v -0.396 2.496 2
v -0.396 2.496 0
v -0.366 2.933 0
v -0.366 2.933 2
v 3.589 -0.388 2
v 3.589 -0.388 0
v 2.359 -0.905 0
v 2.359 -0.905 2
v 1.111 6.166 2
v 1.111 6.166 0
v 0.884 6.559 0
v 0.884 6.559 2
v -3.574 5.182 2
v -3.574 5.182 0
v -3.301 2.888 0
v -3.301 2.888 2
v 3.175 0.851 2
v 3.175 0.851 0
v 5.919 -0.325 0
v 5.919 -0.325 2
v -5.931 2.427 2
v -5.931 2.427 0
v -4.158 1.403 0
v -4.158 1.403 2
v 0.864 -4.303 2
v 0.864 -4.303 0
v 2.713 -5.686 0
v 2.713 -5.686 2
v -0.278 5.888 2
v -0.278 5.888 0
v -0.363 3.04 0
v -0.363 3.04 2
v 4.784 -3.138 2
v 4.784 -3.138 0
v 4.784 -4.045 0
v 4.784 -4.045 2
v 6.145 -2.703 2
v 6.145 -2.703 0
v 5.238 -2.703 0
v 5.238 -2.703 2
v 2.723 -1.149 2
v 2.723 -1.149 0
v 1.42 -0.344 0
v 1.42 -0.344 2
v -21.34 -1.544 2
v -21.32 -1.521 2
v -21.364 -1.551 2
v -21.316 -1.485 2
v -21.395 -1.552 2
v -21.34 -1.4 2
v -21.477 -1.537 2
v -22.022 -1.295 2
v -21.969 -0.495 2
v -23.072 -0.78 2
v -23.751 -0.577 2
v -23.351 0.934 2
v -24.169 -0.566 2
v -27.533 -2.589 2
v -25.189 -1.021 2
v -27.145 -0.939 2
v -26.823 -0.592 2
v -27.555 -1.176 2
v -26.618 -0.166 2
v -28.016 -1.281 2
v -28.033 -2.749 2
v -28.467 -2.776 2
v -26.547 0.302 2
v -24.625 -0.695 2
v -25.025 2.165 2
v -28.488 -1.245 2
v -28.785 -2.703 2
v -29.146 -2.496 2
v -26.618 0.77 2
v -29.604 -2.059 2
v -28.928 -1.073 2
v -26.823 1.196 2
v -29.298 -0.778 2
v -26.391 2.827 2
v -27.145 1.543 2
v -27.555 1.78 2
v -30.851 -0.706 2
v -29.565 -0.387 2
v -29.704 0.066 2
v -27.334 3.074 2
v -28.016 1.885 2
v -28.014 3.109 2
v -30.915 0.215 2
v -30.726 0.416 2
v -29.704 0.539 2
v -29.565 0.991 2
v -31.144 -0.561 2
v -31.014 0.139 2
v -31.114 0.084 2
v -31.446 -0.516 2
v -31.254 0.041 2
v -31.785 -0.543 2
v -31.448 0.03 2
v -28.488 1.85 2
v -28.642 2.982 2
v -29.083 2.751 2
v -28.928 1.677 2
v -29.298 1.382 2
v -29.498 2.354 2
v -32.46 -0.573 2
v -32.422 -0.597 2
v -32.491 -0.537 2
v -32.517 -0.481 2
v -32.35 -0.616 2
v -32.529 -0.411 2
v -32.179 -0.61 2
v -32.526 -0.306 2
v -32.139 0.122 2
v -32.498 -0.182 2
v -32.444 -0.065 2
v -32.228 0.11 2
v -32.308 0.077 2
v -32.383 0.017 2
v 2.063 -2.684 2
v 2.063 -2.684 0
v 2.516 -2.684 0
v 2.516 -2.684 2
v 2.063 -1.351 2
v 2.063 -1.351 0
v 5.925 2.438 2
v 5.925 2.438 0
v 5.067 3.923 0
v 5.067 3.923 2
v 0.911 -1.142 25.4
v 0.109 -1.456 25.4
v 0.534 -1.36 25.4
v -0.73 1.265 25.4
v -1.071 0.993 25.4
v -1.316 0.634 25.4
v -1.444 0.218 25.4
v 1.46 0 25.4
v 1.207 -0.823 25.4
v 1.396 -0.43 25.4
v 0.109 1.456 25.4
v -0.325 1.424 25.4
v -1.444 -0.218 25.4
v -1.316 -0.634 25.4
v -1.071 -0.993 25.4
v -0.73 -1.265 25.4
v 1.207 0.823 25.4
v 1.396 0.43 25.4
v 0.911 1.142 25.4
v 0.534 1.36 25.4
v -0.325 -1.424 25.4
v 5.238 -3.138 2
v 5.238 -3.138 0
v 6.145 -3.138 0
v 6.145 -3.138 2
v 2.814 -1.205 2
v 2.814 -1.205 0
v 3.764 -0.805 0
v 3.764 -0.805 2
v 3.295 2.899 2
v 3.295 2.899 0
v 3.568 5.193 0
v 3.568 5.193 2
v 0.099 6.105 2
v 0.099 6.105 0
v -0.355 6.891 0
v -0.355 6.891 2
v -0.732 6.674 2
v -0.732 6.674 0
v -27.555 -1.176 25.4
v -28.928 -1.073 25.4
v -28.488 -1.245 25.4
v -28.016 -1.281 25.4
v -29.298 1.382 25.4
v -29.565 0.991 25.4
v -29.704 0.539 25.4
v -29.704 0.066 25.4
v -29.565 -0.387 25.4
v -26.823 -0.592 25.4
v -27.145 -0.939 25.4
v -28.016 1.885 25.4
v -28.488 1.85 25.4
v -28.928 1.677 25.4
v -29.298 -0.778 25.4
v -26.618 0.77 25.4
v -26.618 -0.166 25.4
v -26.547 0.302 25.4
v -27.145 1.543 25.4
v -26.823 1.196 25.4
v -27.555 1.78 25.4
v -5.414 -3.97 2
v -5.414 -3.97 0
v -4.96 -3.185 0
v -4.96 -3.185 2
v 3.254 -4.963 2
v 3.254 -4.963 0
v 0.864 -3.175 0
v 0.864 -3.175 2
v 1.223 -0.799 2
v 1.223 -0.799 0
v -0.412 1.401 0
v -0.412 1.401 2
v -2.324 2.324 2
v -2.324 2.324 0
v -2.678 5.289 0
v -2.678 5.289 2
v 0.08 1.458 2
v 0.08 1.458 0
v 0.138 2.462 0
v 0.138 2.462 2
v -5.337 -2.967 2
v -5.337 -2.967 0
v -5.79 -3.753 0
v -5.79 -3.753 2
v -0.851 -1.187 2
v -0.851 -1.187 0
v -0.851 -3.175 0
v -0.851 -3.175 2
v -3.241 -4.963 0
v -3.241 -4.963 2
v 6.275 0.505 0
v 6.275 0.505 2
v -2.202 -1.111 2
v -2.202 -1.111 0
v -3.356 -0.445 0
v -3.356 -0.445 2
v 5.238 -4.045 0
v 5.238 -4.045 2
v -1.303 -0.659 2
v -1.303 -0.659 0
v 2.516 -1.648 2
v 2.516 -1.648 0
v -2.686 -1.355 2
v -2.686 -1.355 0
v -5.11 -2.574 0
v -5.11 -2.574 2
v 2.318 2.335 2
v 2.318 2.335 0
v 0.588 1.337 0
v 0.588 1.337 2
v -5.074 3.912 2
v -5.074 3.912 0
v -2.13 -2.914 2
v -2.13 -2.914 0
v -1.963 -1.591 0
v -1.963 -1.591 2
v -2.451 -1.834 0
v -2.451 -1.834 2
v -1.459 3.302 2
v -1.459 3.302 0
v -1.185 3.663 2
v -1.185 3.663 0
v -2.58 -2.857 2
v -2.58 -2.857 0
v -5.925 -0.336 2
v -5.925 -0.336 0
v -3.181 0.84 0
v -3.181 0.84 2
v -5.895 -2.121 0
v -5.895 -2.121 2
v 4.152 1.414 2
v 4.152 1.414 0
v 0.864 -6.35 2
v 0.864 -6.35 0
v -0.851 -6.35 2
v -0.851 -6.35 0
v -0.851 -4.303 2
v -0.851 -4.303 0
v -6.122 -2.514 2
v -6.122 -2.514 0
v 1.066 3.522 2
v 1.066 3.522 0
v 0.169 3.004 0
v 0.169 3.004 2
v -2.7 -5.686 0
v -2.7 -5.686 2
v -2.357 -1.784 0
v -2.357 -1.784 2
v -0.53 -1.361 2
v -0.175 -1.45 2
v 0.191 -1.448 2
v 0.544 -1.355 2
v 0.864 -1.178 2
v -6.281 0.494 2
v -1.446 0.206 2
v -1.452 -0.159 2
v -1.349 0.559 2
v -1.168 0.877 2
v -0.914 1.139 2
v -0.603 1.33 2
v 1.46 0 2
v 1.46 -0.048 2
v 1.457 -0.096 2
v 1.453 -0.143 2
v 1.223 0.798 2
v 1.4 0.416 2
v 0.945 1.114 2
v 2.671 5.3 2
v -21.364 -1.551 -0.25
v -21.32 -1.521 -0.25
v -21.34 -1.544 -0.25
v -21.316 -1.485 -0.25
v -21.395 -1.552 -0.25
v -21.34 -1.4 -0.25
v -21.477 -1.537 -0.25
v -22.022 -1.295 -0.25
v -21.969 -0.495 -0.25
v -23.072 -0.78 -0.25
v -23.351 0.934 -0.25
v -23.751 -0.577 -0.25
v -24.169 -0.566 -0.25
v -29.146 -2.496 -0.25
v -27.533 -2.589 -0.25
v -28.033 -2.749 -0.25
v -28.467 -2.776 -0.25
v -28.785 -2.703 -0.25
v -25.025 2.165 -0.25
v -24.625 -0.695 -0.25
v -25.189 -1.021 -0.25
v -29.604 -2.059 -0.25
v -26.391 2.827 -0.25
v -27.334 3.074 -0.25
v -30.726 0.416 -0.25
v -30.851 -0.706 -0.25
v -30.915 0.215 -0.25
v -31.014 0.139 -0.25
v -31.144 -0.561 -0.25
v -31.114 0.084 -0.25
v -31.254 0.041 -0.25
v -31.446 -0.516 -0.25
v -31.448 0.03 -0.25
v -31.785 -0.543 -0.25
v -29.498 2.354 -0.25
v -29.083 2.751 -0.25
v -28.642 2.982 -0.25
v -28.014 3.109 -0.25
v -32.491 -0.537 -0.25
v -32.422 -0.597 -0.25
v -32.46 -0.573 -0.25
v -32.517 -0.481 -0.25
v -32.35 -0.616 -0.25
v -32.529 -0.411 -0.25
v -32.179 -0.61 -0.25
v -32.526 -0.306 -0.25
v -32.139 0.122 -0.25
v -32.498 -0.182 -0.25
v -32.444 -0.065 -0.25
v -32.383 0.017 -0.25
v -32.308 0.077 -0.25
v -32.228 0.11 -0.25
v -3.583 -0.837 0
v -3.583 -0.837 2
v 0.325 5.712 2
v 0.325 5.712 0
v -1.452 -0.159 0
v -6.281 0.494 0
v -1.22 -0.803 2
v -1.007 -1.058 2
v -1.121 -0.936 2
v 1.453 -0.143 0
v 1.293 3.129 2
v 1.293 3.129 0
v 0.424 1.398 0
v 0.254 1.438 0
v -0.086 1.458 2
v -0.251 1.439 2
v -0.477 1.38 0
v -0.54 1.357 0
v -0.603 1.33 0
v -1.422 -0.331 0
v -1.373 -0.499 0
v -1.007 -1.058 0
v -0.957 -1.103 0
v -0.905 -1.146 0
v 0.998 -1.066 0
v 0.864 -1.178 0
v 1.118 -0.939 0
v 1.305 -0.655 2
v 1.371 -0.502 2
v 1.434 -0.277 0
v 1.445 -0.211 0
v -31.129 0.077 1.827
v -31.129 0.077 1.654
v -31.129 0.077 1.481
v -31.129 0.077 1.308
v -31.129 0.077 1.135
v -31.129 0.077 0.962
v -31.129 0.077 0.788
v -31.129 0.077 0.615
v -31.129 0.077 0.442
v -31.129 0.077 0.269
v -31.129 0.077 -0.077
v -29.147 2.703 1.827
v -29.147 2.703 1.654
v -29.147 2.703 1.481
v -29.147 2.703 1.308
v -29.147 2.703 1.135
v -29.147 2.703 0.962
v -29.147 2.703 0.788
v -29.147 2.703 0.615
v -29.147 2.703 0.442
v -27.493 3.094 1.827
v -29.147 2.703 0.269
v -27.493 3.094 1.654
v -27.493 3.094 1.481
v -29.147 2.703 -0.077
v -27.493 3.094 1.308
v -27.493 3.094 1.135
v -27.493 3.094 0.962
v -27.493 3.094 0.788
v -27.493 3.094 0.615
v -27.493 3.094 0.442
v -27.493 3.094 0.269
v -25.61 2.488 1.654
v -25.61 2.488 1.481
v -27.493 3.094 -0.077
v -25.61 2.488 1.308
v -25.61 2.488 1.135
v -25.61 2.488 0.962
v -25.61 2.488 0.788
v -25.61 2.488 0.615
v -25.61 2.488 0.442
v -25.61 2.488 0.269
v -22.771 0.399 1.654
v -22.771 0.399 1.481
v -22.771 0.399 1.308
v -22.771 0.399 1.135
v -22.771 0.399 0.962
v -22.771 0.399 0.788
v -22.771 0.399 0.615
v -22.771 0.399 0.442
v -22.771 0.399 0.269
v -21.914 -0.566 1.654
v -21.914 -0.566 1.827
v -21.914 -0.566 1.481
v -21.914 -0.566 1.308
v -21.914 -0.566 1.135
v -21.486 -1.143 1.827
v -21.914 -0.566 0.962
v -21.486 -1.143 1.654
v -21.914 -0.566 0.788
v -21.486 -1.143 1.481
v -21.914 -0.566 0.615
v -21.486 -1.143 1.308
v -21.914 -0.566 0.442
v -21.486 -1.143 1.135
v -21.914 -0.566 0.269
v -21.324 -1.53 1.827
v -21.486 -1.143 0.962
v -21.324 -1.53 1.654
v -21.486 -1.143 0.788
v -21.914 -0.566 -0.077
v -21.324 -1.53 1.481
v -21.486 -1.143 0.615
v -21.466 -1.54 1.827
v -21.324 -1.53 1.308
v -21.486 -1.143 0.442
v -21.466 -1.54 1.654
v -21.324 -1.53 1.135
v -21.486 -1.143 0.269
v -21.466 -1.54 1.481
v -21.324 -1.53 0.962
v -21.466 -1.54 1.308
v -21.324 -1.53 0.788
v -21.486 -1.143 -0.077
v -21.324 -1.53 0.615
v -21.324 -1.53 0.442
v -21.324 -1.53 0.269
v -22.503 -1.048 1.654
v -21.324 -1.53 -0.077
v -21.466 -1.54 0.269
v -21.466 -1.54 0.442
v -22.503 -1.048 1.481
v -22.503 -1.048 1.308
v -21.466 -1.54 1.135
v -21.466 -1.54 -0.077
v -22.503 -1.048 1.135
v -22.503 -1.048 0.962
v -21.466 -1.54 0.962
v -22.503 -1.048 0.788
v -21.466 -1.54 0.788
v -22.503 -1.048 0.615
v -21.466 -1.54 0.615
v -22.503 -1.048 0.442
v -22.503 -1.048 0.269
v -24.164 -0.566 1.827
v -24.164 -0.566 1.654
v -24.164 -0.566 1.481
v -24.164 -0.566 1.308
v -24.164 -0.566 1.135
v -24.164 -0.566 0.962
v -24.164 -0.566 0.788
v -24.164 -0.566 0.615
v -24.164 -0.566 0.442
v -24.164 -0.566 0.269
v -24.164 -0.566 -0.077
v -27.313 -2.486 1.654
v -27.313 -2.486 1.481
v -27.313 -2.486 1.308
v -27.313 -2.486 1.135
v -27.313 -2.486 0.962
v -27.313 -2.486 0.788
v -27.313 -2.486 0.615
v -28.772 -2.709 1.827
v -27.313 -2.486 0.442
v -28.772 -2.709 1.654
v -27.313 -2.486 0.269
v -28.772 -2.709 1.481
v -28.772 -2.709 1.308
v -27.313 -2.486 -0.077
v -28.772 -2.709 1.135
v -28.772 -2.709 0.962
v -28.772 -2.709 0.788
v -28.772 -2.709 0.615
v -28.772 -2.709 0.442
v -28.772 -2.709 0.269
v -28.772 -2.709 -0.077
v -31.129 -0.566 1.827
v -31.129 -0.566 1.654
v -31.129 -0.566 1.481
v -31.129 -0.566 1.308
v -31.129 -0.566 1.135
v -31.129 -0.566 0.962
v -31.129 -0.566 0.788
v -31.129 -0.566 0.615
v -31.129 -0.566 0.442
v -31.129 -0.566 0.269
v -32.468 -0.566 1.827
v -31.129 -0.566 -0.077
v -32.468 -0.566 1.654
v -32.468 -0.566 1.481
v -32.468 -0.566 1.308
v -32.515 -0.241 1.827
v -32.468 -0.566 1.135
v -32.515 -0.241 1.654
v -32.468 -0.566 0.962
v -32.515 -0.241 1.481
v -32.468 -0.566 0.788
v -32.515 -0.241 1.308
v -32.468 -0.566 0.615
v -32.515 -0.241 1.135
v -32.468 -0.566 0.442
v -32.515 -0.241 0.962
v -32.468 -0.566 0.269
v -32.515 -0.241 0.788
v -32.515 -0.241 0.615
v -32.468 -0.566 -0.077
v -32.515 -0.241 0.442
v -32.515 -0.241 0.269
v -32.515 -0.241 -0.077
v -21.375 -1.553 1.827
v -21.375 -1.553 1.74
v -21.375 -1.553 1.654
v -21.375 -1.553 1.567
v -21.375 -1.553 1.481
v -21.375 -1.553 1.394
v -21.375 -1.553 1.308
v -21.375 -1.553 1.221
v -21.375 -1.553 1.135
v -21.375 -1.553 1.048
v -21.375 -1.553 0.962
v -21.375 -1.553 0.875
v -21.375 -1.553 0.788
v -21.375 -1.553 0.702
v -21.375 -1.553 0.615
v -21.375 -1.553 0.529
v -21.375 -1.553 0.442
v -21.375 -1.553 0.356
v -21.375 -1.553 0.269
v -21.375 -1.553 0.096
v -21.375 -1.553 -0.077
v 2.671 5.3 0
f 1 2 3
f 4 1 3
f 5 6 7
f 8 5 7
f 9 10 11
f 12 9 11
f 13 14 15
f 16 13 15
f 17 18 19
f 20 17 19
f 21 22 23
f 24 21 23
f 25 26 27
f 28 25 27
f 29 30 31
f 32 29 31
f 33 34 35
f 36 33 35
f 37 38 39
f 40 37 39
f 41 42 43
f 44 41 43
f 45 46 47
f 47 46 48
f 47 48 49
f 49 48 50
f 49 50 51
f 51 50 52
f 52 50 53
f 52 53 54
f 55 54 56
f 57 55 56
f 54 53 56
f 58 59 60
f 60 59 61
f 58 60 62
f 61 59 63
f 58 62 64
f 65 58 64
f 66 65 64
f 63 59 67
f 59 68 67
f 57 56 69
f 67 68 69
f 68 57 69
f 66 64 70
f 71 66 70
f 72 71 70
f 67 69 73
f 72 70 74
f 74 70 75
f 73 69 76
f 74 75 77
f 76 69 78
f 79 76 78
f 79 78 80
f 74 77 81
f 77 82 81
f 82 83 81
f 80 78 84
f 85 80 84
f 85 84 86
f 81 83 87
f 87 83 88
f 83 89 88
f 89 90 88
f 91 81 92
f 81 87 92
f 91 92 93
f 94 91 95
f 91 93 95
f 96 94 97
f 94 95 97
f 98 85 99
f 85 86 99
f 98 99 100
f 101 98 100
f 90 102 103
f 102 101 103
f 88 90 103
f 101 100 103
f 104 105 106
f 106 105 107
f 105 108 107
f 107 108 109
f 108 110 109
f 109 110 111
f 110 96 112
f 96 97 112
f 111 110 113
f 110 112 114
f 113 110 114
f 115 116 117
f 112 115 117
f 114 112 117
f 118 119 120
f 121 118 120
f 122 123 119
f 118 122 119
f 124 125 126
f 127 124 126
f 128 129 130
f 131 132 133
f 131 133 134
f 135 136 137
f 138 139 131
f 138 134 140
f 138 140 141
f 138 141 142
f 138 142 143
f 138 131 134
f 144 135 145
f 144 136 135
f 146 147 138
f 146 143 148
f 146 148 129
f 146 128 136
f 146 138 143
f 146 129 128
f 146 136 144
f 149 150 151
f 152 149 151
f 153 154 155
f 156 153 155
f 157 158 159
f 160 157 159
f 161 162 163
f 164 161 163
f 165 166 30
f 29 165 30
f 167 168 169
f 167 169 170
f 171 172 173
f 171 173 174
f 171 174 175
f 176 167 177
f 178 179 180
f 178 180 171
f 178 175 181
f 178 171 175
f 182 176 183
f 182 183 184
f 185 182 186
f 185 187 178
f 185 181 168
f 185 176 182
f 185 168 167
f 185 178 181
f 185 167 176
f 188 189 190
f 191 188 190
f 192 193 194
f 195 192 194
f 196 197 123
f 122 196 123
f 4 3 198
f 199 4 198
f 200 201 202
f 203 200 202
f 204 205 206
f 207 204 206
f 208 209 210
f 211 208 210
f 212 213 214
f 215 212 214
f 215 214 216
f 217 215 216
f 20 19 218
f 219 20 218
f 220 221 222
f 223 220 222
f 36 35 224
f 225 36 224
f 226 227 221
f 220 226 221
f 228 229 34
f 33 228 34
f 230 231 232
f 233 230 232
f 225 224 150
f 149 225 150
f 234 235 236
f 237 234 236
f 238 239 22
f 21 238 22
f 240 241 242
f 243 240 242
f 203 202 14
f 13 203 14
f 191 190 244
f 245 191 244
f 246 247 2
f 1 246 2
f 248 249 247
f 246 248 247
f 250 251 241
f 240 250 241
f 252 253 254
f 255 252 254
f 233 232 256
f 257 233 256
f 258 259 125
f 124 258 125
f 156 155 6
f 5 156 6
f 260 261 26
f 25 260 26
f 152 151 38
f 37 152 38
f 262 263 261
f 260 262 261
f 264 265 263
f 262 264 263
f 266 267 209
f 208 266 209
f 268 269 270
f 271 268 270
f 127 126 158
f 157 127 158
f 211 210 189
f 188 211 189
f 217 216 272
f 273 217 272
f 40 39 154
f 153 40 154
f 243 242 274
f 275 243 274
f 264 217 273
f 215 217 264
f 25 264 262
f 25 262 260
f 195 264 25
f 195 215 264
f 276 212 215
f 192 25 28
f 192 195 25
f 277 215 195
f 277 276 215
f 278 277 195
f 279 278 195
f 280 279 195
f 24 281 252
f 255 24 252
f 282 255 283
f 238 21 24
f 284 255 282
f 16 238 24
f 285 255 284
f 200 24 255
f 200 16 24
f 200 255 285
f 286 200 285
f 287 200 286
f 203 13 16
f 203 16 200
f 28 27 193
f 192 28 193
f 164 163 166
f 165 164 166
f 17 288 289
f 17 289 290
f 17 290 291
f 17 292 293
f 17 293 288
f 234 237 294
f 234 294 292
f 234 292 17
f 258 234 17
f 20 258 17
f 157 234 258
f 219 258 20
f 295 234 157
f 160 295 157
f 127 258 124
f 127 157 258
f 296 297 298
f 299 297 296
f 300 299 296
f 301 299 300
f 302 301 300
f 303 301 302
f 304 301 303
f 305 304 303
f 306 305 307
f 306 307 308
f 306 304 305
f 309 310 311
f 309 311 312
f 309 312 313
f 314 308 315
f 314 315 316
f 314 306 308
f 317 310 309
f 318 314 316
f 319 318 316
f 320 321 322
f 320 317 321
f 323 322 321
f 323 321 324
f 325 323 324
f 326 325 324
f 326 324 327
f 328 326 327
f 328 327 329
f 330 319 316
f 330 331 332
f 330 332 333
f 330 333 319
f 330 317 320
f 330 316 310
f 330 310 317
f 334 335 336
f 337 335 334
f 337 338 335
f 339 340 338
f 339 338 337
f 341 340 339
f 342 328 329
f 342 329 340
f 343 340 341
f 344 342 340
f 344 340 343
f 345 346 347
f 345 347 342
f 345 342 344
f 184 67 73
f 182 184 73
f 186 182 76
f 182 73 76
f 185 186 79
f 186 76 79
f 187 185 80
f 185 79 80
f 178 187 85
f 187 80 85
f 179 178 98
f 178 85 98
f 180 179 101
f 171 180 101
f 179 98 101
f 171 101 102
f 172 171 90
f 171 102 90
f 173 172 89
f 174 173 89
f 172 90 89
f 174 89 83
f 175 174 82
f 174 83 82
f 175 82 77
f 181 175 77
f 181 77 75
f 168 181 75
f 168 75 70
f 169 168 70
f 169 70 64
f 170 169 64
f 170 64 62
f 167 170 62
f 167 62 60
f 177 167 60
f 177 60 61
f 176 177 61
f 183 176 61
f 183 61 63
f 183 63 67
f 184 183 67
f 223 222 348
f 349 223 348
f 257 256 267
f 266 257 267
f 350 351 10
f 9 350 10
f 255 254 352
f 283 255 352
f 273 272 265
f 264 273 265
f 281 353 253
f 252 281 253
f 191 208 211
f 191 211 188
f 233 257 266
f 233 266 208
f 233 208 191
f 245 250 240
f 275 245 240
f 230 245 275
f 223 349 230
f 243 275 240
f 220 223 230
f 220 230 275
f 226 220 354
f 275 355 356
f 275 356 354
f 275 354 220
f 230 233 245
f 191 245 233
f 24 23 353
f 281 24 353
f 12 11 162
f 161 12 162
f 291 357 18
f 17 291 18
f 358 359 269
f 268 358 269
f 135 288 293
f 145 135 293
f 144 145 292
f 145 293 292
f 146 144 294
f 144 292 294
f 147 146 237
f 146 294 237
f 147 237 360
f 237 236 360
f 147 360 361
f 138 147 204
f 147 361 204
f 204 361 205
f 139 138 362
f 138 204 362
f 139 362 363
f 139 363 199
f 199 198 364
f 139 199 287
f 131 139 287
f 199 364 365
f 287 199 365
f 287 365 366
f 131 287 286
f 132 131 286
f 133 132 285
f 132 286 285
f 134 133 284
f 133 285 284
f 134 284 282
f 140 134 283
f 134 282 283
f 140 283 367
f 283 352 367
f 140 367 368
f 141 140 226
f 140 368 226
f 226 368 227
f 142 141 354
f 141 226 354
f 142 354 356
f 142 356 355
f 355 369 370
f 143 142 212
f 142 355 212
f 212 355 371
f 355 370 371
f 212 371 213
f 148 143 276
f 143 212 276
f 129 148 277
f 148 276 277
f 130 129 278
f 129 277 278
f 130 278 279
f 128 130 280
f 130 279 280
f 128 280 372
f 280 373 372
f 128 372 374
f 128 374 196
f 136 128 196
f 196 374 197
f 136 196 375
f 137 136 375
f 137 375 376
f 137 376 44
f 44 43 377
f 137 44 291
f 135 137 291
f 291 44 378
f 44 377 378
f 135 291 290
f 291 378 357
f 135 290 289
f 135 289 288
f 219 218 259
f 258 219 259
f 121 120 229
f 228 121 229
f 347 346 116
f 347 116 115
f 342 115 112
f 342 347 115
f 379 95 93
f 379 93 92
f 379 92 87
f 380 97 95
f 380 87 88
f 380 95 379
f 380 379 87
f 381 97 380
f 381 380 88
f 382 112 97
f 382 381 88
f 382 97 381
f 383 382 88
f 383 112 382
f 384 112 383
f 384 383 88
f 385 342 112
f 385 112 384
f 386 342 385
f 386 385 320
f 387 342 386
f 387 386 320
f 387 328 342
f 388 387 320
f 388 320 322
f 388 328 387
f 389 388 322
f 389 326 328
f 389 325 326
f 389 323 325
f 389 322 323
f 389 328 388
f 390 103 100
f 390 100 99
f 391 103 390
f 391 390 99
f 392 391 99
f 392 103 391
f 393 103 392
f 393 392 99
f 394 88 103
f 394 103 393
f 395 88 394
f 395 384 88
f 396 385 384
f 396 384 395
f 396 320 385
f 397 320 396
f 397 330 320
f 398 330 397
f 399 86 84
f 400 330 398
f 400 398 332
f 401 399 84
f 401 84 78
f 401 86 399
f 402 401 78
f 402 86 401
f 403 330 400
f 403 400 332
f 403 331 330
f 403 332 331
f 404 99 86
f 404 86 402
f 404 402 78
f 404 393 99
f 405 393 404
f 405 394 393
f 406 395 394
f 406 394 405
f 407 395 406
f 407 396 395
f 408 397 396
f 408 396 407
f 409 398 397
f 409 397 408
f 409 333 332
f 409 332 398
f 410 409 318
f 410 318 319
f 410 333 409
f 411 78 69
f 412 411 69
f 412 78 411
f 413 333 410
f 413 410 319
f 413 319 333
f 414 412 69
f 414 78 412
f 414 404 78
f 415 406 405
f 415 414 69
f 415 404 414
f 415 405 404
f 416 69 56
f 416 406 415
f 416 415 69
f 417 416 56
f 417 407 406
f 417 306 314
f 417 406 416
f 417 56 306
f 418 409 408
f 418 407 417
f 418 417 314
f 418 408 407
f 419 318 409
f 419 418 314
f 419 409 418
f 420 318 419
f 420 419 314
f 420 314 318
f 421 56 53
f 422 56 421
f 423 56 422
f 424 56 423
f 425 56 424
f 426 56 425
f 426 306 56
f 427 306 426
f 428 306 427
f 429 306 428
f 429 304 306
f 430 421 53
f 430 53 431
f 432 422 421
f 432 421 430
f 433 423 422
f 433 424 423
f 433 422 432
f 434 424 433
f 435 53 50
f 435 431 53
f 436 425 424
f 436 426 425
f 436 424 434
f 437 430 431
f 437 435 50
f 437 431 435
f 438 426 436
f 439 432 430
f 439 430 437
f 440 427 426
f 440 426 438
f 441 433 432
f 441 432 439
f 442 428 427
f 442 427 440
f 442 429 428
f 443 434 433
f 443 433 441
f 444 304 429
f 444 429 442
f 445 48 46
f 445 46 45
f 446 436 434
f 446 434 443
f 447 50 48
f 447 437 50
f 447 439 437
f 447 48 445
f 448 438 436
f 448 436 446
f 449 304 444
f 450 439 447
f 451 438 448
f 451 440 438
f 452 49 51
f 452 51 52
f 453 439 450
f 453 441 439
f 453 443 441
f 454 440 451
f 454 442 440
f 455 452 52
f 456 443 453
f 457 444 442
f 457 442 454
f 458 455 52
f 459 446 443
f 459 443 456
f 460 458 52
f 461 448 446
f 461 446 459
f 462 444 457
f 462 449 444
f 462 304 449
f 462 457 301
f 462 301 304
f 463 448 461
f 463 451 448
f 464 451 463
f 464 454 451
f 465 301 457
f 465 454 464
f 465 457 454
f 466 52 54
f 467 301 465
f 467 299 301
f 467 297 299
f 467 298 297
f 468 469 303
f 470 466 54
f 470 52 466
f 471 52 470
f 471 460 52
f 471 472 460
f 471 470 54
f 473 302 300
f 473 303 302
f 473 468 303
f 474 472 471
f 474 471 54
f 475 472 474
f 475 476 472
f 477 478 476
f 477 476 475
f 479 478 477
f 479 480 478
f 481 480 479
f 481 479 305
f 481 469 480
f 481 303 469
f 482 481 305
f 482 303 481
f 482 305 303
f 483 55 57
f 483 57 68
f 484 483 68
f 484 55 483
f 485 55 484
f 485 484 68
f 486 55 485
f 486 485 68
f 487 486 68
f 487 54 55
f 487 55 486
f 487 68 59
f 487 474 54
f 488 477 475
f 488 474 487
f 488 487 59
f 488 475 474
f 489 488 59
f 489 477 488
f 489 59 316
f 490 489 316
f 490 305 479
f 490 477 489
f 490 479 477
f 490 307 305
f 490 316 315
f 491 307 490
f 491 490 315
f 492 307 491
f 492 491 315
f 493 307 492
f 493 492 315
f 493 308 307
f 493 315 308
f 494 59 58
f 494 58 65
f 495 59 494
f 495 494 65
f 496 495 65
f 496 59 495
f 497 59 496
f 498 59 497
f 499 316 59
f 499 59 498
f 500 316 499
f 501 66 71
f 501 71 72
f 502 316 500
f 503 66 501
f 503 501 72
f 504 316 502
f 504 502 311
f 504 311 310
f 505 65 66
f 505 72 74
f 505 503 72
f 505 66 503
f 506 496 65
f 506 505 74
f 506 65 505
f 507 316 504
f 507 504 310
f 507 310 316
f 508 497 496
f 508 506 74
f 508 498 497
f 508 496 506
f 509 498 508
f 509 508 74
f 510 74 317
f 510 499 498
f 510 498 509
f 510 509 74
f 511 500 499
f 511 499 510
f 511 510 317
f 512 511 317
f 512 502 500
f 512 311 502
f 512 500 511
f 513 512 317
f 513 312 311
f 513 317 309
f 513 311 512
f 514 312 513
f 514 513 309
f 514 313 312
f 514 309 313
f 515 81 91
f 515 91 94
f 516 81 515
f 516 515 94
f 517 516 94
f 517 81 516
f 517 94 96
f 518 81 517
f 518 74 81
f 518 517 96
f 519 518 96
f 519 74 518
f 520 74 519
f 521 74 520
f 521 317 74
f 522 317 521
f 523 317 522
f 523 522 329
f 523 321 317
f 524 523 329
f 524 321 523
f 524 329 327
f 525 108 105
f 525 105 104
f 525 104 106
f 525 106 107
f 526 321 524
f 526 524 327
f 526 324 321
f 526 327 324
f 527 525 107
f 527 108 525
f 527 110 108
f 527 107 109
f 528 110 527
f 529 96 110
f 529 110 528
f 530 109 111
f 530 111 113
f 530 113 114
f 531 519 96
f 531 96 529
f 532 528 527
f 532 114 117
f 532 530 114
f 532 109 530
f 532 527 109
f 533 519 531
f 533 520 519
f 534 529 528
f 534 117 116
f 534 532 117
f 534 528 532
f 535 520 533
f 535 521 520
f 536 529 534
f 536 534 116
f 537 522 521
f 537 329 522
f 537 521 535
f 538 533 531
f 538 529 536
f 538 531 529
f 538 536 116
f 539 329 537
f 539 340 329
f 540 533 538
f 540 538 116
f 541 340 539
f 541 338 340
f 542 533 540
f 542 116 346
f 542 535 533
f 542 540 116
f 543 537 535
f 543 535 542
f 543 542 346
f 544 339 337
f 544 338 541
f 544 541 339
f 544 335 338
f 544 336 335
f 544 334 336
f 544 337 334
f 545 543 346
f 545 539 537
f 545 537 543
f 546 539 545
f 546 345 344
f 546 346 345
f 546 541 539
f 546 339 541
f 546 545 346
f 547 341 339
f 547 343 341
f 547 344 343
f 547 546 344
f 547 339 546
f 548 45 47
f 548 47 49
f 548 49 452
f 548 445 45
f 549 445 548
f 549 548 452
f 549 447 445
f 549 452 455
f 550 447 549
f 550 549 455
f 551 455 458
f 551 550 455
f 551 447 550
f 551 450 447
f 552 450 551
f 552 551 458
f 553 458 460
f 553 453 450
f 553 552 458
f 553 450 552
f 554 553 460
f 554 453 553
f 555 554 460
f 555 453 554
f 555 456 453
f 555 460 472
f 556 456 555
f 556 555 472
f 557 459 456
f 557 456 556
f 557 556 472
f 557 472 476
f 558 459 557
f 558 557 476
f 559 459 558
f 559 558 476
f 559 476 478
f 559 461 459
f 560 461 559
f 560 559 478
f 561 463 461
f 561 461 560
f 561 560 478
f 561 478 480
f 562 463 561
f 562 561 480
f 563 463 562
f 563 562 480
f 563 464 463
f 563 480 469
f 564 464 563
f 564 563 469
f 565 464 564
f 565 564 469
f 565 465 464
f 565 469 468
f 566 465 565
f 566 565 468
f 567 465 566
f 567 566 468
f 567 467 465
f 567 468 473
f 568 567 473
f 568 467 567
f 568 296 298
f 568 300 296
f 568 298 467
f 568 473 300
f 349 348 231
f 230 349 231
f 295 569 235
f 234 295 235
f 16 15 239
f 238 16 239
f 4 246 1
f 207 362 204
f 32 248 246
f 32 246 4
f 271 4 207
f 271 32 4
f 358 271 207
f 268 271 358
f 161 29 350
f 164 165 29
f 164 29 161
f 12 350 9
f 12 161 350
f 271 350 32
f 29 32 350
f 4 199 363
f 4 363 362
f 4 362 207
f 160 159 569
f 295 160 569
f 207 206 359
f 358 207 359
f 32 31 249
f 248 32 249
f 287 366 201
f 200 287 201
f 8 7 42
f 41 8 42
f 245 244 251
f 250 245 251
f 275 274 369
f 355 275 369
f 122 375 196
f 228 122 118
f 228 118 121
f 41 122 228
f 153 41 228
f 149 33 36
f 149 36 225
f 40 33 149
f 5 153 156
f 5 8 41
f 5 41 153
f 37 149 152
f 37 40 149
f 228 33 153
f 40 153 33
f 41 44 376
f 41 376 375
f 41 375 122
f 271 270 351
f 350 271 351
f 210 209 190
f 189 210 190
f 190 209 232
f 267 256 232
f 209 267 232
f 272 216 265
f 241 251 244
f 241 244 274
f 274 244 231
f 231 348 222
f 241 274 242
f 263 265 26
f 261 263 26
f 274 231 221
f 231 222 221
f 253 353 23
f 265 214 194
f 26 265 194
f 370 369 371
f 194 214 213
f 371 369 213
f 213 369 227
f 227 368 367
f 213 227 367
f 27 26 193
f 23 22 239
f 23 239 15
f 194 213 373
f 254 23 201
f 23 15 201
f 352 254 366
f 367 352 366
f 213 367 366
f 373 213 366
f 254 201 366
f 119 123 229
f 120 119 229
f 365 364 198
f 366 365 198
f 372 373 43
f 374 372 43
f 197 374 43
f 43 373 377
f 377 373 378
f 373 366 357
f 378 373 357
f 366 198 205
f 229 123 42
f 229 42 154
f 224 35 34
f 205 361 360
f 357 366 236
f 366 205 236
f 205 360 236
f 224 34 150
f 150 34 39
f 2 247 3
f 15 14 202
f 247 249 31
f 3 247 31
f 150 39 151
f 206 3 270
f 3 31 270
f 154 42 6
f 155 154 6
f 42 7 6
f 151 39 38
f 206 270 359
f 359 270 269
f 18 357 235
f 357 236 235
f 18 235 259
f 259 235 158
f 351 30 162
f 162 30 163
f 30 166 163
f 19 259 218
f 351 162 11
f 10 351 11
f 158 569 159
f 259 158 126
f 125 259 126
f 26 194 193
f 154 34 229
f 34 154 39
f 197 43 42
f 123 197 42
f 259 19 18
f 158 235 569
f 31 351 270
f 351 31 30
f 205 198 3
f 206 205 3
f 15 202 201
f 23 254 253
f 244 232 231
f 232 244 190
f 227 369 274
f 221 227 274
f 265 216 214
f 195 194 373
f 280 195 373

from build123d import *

# Parameters (mm, degrees)
F2_DEPTH  = 2
F1_R      = 1.4605
F3_DEPTH  = 25.4
F5_DEPTH  = 1
F7_SCALE  = 2.25
F9_R      = 1.5875
F10_DEPTH = 25.4


# Not quite as in the source:
# - ends of sketch curves that miss each other by under 0.0002 mm in the source are joined


with BuildPart() as f2:
    # F0 (on Top) → F2 (new body)
    with BuildSketch(Plane.XY):
        Polygon((-0.0127014339, 0.9898670365), (0.0557615141, 1.029394138), (0.138240911, 2.4622835197), (0.1693981397, 3.0035685424), (0.3253258613, 5.7124532465), (1.1109840408, 6.166053208), (0.8841841765, 6.5588820961), (0.0985259969, 6.1052821346), (-0.3550739645, 6.8909403142), (-0.7315351504, 6.6735903472), (-0.2779351889, 5.8879321677), (-0.3631976516, 3.0396497277), (-0.3593508306, 3.0367321709), (-0.3663883129, 2.9330623245), (-0.4175601747, 1.2236123396), align=None)
        Polygon((-0.8508992831, -0.9734238887), (-0.8508992831, -0.5059332827), (-0.9193622311, -0.4664061812), (-2.2015205349, -1.1114216191), (-2.6858657296, -1.3550811789), (-5.10979256, -2.5744861629), (-5.8954507396, -2.1208862014), (-6.1222506039, -2.5137150896), (-5.3365924243, -2.967315051), (-5.7901923858, -3.7529732306), (-5.4137312, -3.9703231976), (-4.9601312385, -3.184665018), (-2.450815057, -1.8343632567), (-2.4502117892, -1.8295730336), (-2.3569123275, -1.7838327489), align=None)
        Polygon((0, 1.348e-07), (0.0063507169, 1.348e-07), (0.8636007169, 1.348e-07), (1.2684594578, -0.2501884508), (3.1750801818, 0.8505995374), (4.151752869, 1.4144817763), (5.9247108388, 2.4380995374), (5.0674608388, 3.9229000922), (3.294502869, 2.8992823311), (2.3178301818, 2.3354000922), (0.0557615141, 1.029394138), (0.0513573913, 0.9528826566), (0.4254497583, 0.7369003278), align=None)
        Polygon((0.4254495248, -0.7369004626), (-1.167e-07, -6.74e-08), (-0.0031752417, -0.0054999496), (-0.4318002417, -0.747900227), (-0.8508992831, -0.9734238887), (-0.8508992831, -3.1749998652), (-0.8508992831, -4.3027643429), (-0.8508992831, -6.3499998652), (0.8636007169, -6.3499998652), (0.8636007169, -4.3027643429), (0.8636007169, -3.1749998652), (0.8636007169, -0.5629879568), (0.7995418918, -0.5209181338), align=None)
        Polygon((-0.8508992831, -4.3027643429), (-0.8508992831, -3.1749998652), (-3.2412230885, -4.9631580294), (-2.7002857532, -5.6862570345), align=None)
        Polygon((3.2539245223, -4.9631580294), (0.8636007169, -3.1749998652), (0.8636007169, -4.3027643429), (2.7129871871, -5.6862570345), align=None)
        Polygon((2.5164675899, -1.6484873635), (2.0632796239, -1.3508619006), (2.0632796239, -2.6843671221), (2.5164675899, -2.6843671221), align=None)
        Polygon((2.359458579, -0.90489005), (2.7233006404, -1.1492295757), (2.8140127086, -1.205286471), (3.7643470012, -0.8053710598), (3.5885683743, -0.3876615832), align=None)
        Polygon((0.1693981397, 3.0035685424), (0.138240911, 2.4622835197), (1.2930903089, 3.1290361305), (1.0664963259, 3.5215084217), align=None)
        Polygon((-0.3960715185, 2.4957960936), (-0.3663883129, 2.9330623245), (-0.3631976516, 3.0396497277), (-1.1847017034, 3.6627056616), (-1.458559408, 3.301622167), align=None)
        Polygon((4.151752869, 1.4144817763), (3.1750801818, 0.8505995374), (5.9188324807, -0.3254025192), (6.274585921, 0.5046124575), align=None)
        Polygon((2.6712586753, 5.299560313), (2.3178301818, 2.3354000922), (3.294502869, 2.8992823311), (3.5679494508, 5.1926443415), align=None)
        Polygon((-2.6858657296, -1.3550811789), (-2.2015205349, -1.1114216191), (-3.3563699328, -0.4446690084), (-3.5829639158, -0.8371412996), align=None)
        Polygon((-1.9633870605, -1.5909060436), (-2.3569123275, -1.7838327489), (-2.450815057, -1.8343632567), (-2.5796452979, -2.8573346018), (-2.1300089663, -2.9139605838), align=None)
        Polygon((-3.3008535859, 2.8882825667), (-2.3241808987, 2.3244003278), (-2.6776093922, 5.2885605486), (-3.5743001677, 5.181644577), align=None)
        Polygon((-5.9251831976, -0.3364022836), (-3.1814308987, 0.839599773), (-4.1581035859, 1.4034820119), (-6.2809366379, 0.4936126931), align=None)
        Polygon((0.8636007169, 1.348e-07), (0.0063507169, 1.348e-07), (0.7995418918, -0.5209181338), (0.8636007169, -0.4839337539), align=None)
        Polygon((-0.8508992831, 1.348e-07), (0, 1.348e-07), (-0.0031754752, 0.0054998148), (-0.4318004752, 0.7479000922), (-0.4175601747, 1.2236123396), (-2.3241808987, 2.3244003278), (-3.3008535859, 2.8882825667), (-5.0738115558, 3.9119003278), (-5.9310615558, 2.427099773), (-4.1581035859, 1.4034820119), (-3.1814308987, 0.839599773), (-0.9193622311, -0.4664061812), (-0.8508992831, -0.4319645227), align=None)
        Polygon((1.2684594578, -0.2501884508), (0.8636007169, -0.4839337539), (0.8636007169, -0.5629879568), (2.0632796239, -1.3508619006), (2.5164675899, -1.6484873635), (4.7844666988, -3.1379670836), (4.7844666988, -4.0451670066), (5.2380664274, -4.0451670066), (5.2380664274, -3.1379670836), (6.1452663504, -3.1379670836), (6.1452663504, -2.7032671496), (5.2380664274, -2.7032671496), (2.8140127086, -1.205286471), (2.8095626198, -1.2071591373), (2.7233006404, -1.1492295757), align=None)
        Polygon((0.7995418918, -0.5209181338), (0.0063507169, 1.348e-07), (0, 1.348e-07), (0.4254495248, -0.7369004626), align=None)
        Polygon((-0.4318004752, 0.7479000922), (-0.0031754752, 0.0054998148), (0.0513573913, 0.9528826566), (-0.0127014339, 0.9898670365), align=None)
        Polygon((-0.0031754752, 0.0054998148), (-1.167e-07, -6.74e-08), (0.4254497583, 0.7369003278), (0.0513573913, 0.9528826566), align=None)
        Polygon((-0.4318002417, -0.747900227), (-0.0031752417, -0.0054999496), (-0.8508992831, -0.4319645227), (-0.8508992831, -0.5059332827), align=None)
        Polygon((-0.0031752417, -0.0054999496), (1.167e-07, -6.74e-08), (-0.8508992831, 1.348e-07), (-0.8508992831, -0.4319645227), align=None)
        Polygon((1.2684594578, -0.2501884508), (0.8636007169, 1.348e-07), (0.8636007169, -0.4839337539), align=None)
        Polygon((-0.8508992831, -0.9734238887), (-0.4318002417, -0.747900227), (-0.8508992831, -0.5059332827), align=None)
        Polygon((-0.0127014339, 0.9898670365), (0.0513573913, 0.9528826566), (0.0557615141, 1.029394138), align=None)
        Polygon((-0.8508992831, -0.5059332827), (-0.8508992831, -0.4319645227), (-0.9193622311, -0.4664061812), align=None)
        Polygon((-0.3631976516, 3.0396497277), (-0.3663883129, 2.9330623245), (-0.3593508306, 3.0367321709), align=None)
        Polygon((2.8140127086, -1.205286471), (2.7233006404, -1.1492295757), (2.8095626198, -1.2071591373), align=None)
        Polygon((-0.4175601747, 1.2236123396), (-0.4318004752, 0.7479000922), (-0.0127014339, 0.9898670365), align=None)
        Polygon((0.8636007169, -0.4839337539), (0.7995418918, -0.5209181338), (0.8636007169, -0.5629879568), align=None)
        Polygon((-2.450815057, -1.8343632567), (-2.3569123275, -1.7838327489), (-2.4502117892, -1.8295730336), align=None)
    extrude(amount=F2_DEPTH)

    # F1 (on Top) → F3 (join)
    with BuildSketch(Plane.XY):
        Circle(F1_R)
    extrude(amount=F3_DEPTH)


with BuildPart() as f5:
    # F4 (on Top) → F5 (new body)
    with BuildSketch(Plane.XY):
        with BuildLine():
            add(Edge.make_bspline(
                [(-29.8669375479, 0.2857499931), (-29.7440304745, 0.3571436979), (-29.1547614666, -0.031081706), (-28.6573535606, 1.9086215428), (-26.8097076406, 1.4876465764), (-25.6137182394, 0.4424417951), (-25.3000873709, 0.0757578444), (-24.7765698555, -0.6160305024), (-25.5747691832, -0.1631625611), (-26.2801418295, 0.1338939544), (-26.9852315195, -0.4157522042), (-28.4156101147, -1.4829106615), (-29.1578723902, 0.3232844338), (-30.049192476, -0.1925589818), (-29.9590967439, 0.2322169762), (-29.8669375479, 0.2857499931)],
                knots=[0, 0, 0, 0, 0.0595602967, 0.1590621278, 0.2623182491, 0.3653254409, 0.4276419031, 0.4859643703, 0.5478739218, 0.6200200353, 0.696962825, 0.7939279281, 0.8918484857, 0.9553400069, 1, 1, 1, 1], degree=3))
        make_face()
    extrude(amount=F5_DEPTH)


with BuildPart() as f5_1:
    # F7: moved
    add(f5.part.scale(F7_SCALE).moved(Location((34.892889671, -0.5655468703, -1.25))))


with BuildPart() as f5_2:
    # F8: moved
    add(f5_1.part.moved(Location((0, 0, 1))))

    # F9 (on Top) → F10 (join)
    with BuildSketch(Plane.XY):
        with Locations((-28.1345900148, 0.302218803)):
            Circle(F9_R)
    extrude(amount=F10_DEPTH)


solid = Compound([f2.part, f5_2.part])
